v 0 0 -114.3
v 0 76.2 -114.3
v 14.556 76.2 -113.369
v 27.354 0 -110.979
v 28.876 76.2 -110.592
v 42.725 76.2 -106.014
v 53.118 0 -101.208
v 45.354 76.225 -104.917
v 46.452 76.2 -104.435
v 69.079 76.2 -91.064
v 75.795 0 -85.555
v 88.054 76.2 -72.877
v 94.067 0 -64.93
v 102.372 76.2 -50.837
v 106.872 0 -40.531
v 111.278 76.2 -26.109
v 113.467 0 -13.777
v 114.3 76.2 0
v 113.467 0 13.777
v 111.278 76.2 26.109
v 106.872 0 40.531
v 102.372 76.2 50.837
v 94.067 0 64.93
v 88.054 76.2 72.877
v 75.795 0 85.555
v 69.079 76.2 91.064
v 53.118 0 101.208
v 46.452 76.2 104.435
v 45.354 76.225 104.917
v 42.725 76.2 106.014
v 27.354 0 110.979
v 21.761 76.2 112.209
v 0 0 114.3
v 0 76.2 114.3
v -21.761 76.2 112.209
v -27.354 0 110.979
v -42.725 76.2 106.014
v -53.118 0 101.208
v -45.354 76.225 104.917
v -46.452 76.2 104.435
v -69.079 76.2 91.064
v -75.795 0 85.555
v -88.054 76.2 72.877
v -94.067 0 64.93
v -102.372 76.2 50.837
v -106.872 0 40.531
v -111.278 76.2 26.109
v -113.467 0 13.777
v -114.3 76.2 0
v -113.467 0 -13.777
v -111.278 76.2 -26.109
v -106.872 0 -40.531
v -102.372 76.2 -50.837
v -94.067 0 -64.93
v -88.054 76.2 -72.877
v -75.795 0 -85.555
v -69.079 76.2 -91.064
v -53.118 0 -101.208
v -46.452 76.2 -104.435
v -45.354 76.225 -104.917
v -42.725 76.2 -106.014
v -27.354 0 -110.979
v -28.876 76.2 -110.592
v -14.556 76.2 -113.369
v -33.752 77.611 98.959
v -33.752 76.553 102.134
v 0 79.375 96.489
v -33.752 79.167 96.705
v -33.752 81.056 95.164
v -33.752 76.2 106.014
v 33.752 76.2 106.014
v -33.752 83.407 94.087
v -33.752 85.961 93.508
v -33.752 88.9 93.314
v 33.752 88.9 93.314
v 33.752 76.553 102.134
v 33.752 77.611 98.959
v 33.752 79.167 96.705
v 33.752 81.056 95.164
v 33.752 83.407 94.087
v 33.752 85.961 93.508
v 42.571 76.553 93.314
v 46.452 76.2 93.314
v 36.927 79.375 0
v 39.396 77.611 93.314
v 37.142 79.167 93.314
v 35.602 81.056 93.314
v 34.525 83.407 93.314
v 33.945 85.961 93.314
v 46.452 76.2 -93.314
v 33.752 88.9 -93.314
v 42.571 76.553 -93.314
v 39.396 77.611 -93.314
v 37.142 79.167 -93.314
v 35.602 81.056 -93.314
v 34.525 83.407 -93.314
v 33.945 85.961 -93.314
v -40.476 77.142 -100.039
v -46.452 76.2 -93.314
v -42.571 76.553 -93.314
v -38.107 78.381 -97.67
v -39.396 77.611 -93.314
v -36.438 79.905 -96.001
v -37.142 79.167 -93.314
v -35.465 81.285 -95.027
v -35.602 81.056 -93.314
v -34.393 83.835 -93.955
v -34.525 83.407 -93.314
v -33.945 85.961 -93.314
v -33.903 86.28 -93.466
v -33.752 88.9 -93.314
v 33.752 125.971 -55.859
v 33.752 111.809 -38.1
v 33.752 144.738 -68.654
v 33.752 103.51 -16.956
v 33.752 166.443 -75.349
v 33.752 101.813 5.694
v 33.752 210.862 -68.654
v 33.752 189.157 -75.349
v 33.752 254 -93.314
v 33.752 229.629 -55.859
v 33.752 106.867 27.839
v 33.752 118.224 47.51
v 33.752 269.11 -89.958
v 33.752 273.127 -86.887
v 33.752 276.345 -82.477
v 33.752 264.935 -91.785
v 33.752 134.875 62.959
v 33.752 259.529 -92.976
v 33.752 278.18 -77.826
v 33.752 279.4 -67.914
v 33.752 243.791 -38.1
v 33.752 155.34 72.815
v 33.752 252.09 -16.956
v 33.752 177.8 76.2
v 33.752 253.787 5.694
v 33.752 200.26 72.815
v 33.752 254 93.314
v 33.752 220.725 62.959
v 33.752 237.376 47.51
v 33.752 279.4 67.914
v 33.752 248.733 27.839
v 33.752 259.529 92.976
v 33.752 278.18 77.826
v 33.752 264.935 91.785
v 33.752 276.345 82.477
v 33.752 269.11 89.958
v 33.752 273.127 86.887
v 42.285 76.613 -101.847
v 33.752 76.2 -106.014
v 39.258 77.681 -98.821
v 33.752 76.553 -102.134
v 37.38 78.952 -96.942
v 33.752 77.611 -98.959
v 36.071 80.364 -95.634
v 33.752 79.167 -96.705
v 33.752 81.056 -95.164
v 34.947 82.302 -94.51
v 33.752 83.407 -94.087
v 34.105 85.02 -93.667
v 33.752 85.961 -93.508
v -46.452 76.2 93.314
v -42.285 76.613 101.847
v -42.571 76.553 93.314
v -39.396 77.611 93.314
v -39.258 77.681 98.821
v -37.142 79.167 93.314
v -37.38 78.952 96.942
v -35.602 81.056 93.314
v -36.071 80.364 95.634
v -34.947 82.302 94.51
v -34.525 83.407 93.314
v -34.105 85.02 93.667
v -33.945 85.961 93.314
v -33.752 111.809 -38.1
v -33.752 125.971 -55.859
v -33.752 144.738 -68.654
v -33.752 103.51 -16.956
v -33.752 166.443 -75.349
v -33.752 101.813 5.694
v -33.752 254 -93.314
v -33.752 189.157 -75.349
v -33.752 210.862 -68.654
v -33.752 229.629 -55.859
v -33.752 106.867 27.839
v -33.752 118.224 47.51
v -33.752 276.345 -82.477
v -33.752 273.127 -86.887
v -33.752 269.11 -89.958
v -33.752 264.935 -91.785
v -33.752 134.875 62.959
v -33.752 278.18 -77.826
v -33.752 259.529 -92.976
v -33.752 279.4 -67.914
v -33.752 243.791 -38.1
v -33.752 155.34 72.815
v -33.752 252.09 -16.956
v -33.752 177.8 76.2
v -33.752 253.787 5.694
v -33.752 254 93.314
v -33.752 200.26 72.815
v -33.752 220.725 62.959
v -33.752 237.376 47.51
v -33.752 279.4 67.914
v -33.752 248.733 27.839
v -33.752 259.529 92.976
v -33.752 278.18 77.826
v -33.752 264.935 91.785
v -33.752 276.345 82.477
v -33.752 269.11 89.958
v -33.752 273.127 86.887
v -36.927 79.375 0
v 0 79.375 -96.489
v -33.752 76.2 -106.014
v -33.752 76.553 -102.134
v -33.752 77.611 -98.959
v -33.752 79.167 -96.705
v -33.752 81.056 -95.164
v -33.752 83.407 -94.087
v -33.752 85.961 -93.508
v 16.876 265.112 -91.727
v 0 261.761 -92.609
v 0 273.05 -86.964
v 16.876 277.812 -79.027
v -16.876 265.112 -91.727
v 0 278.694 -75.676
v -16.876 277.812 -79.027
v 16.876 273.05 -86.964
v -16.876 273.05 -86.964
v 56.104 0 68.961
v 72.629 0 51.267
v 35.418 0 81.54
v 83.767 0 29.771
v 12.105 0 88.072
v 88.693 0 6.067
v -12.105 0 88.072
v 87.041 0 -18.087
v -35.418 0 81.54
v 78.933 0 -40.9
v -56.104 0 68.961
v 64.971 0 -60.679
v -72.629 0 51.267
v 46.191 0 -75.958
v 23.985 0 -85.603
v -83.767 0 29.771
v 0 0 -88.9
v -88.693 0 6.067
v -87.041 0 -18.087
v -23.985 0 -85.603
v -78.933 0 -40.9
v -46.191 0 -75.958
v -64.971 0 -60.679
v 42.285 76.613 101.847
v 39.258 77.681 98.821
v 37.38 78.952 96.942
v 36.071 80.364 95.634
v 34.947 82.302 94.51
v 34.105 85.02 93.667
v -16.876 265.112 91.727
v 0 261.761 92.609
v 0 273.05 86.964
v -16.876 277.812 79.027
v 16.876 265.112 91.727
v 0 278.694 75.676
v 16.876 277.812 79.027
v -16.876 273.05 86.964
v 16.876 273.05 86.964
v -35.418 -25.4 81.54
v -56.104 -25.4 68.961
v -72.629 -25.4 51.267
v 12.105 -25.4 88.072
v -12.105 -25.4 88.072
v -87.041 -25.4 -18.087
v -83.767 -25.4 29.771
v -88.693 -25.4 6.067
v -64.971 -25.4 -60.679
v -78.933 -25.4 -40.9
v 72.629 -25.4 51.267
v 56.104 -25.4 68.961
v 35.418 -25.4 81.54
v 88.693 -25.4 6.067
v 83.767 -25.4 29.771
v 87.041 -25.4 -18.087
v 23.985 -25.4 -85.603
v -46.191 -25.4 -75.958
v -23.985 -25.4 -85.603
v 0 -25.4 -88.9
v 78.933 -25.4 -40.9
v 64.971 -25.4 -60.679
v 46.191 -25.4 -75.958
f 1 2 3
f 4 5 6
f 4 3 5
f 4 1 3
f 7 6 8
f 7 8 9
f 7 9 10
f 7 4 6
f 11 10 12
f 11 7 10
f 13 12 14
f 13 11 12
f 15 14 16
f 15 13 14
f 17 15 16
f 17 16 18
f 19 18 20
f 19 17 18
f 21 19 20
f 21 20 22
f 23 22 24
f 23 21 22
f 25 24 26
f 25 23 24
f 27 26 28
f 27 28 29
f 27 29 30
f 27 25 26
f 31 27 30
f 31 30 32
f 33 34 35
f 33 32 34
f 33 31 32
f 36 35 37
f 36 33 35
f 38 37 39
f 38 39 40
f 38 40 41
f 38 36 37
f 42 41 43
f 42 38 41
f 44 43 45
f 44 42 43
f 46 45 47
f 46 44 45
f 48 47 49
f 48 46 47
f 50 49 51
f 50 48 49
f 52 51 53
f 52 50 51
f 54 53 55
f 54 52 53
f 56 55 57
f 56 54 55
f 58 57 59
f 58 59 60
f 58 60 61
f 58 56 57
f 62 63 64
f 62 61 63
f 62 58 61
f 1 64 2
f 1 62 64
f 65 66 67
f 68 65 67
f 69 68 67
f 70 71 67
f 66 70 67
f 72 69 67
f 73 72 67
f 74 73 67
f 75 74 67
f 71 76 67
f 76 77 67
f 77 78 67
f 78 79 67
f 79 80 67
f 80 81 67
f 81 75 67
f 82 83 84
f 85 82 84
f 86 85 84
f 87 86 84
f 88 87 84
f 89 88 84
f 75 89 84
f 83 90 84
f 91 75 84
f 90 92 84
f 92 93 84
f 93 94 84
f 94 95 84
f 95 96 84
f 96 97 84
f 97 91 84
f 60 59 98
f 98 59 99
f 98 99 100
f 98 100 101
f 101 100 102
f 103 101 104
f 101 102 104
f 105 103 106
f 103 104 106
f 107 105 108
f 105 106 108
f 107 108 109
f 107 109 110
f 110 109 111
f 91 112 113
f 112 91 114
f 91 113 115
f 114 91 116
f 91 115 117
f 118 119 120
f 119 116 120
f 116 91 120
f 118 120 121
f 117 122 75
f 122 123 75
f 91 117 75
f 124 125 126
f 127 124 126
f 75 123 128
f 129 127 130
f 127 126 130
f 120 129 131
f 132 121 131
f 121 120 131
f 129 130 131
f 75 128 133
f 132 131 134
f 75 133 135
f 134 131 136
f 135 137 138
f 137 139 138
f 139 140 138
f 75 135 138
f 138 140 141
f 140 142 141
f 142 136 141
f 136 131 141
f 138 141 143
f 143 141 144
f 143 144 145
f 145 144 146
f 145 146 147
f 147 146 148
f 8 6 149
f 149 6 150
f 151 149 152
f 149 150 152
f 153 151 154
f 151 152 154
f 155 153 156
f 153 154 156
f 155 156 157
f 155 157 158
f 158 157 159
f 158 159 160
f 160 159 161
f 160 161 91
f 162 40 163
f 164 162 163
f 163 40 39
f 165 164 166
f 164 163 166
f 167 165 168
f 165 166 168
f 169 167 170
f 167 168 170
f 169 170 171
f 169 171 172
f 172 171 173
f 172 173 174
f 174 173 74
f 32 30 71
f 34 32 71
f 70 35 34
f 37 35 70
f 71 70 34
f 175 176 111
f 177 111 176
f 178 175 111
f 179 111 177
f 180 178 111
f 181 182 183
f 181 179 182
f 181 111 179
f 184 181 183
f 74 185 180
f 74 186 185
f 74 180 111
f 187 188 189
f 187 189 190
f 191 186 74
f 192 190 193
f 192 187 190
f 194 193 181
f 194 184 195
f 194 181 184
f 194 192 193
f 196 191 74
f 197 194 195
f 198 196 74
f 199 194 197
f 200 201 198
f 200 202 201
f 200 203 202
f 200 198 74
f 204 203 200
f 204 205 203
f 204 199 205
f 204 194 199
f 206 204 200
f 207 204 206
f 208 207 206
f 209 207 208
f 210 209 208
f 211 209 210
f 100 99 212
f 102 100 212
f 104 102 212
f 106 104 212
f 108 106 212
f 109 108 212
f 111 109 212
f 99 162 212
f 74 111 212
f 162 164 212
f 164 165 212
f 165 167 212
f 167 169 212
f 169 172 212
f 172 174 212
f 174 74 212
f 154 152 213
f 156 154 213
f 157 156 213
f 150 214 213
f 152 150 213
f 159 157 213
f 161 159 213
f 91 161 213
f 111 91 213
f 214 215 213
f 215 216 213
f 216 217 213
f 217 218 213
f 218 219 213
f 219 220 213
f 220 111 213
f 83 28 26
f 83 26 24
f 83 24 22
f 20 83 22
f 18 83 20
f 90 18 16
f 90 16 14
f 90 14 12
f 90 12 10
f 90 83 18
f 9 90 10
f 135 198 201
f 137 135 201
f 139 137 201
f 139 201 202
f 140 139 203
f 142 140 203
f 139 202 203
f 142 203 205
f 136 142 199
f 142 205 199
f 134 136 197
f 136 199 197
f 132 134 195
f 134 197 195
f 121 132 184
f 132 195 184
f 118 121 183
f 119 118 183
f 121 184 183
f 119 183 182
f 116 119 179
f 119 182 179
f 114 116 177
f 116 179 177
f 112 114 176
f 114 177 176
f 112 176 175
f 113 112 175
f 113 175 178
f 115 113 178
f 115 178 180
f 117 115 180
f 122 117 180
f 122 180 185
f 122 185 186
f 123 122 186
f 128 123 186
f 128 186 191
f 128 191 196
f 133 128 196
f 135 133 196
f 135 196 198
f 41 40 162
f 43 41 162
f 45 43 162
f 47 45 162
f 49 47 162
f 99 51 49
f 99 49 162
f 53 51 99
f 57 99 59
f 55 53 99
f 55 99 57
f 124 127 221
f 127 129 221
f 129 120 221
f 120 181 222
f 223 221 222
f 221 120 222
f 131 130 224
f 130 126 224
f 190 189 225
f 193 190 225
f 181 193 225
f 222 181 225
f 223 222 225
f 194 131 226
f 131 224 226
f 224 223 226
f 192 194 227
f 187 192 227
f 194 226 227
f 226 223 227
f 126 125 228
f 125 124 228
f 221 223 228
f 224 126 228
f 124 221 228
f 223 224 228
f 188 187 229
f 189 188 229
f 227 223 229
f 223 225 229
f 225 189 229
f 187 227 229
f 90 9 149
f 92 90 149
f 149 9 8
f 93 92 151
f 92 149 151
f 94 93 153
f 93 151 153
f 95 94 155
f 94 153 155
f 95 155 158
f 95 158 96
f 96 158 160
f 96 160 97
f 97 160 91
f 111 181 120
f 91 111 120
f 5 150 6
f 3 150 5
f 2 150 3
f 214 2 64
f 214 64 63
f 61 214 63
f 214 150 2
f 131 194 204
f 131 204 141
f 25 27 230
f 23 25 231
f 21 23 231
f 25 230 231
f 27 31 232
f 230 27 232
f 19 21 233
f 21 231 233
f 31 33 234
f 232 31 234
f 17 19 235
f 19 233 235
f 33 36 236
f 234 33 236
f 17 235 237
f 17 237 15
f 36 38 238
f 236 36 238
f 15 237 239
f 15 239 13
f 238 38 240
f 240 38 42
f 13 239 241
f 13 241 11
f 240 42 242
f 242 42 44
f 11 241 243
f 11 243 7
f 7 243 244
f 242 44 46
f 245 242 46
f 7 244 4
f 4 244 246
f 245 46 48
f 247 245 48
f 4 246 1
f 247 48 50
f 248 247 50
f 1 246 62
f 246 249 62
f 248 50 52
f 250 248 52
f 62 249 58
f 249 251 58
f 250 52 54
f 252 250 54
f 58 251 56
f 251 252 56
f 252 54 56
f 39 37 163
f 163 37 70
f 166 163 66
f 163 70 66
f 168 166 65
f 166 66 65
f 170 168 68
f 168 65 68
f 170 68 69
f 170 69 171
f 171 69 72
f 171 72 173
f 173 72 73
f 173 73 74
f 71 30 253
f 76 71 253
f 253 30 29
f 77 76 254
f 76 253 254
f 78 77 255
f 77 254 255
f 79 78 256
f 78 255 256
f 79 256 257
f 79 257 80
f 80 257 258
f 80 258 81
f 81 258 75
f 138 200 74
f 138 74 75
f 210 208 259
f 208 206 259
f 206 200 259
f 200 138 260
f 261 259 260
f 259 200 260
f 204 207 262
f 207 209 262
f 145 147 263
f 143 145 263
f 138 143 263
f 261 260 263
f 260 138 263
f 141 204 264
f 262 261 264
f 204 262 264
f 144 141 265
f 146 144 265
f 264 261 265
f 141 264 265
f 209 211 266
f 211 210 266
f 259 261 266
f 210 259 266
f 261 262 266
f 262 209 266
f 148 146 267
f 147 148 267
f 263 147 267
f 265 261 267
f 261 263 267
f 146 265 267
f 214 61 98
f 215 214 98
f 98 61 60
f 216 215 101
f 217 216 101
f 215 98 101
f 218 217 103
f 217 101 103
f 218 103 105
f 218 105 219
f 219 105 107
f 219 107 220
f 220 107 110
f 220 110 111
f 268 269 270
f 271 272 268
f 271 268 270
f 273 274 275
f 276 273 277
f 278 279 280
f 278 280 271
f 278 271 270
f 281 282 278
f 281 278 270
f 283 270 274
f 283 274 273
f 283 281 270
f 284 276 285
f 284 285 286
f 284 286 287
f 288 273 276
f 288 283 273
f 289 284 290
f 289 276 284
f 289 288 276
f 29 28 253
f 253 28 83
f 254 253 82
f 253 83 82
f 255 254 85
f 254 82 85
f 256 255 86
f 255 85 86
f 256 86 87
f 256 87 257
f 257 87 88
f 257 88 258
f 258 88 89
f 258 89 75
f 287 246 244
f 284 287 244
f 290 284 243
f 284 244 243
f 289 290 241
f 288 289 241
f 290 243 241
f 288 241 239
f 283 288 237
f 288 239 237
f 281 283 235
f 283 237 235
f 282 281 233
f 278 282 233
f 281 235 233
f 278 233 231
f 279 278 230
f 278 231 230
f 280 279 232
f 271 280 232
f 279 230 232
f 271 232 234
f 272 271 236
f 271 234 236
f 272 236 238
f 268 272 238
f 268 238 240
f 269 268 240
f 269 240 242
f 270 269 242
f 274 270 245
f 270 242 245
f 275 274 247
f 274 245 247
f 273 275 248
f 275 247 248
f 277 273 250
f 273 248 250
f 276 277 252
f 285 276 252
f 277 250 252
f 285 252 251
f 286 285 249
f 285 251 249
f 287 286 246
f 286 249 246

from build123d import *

# Parameters (mm, degrees)
SKETCH1_R           = 114.3
BOSS_EXTRUDE1_DEPTH = 76.2
SKETCH2_R           = 88.9
BOSS_EXTRUDE2_DEPTH = 25.4
SKETCH3_W           = 67.503621206
SKETCH3_H           = 186.628871474
BOSS_EXTRUDE3_DEPTH = 203.2
SKETCH4_R           = 76.2
CUT_EXTRUDE1_DEPTH  = 127
FILLET1_SIZE        = 25.4
FILLET2_SIZE        = 12.7


with BuildPart() as part:
    # Sketch1 → Boss-Extrude1 (new body)
    with BuildSketch(Plane(origin=(0, 0, 0), x_dir=(1, 0, 0), z_dir=(0, 1, 0))):
        with Locations(Location((0, 0, 0), (0, 0, 90))):
            Circle(SKETCH1_R)
    extrude(amount=BOSS_EXTRUDE1_DEPTH)

    # Sketch2 → Boss-Extrude2 (add)
    with BuildSketch(Plane(origin=(0, 0, 0), x_dir=(-1, 0, 0), z_dir=(0, -1, 0))):
        with Locations(Location((0, 0, 0), (0, 0, 90))):
            Circle(SKETCH2_R)
    extrude(amount=BOSS_EXTRUDE2_DEPTH)

    # Sketch3 → Boss-Extrude3 (add)
    with BuildSketch(Plane(origin=(0, 76.2, 0), x_dir=(1, 0, 0), z_dir=(0, 1, 0))):
        Rectangle(SKETCH3_W, SKETCH3_H)
    extrude(amount=BOSS_EXTRUDE3_DEPTH)

    # Sketch4 → Cut-Extrude1 (cut)
    with BuildSketch(Plane.ZY.offset(33.751810603)):
        with Locations((0, 177.8)):
            Circle(SKETCH4_R)
    extrude(amount=-CUT_EXTRUDE1_DEPTH, mode=Mode.SUBTRACT)

    # Fillet1
    # a fillet whose section is not a circle: 25.4 mm, written as the material it takes off along each edge
    with BuildSketch(Plane(origin=(97.251810603, 279.4, 93.314435737), x_dir=(0, -1, 0), z_dir=(-1, 0, 0)), Plane(origin=(-97.251810603, 279.4, -93.314435737), x_dir=(0, -1, 0), z_dir=(1, 0, 0))) as fillet1_piece_1:
        with BuildLine():
            Bezier((FILLET1_SIZE, 0), (0, 0), (0, -FILLET1_SIZE), weights=[1, 1, 1])
            Line((0, -FILLET1_SIZE), (0, 0))
            Line((0, 0), (FILLET1_SIZE, 0))
        make_face()
    extrude(amount=194.503621206, mode=Mode.SUBTRACT)

    # Fillet2
    # a fillet whose section is not a circle: 12.7 mm, written as the material it adds along each edge
    with BuildSketch(Plane(origin=(33.751810603, 76.2, 93.314435737), x_dir=(0, 0, 1), z_dir=(-1, 0, 0)), Plane(origin=(-33.751810603, 76.2, -93.314435737), x_dir=(0, 0, -1), z_dir=(1, 0, 0))) as fillet2_piece_1:
        with BuildLine():
            Bezier((FILLET2_SIZE, 0), (0, 0), (0, FILLET2_SIZE), weights=[1, 1, 1])
            Line((0, FILLET2_SIZE), (0, 0))
            Line((0, 0), (FILLET2_SIZE, 0))
        make_face()
    extrude(amount=67.503621206)
    with BuildSketch(Plane(origin=(-33.751810603, 76.2, 93.314435737), x_dir=(-1, 0, 0), z_dir=(0, 0, -1)), Plane(origin=(33.751810603, 76.2, -93.314435737), x_dir=(1, 0, 0), z_dir=(0, 0, 1))) as fillet2_piece_2:
        with BuildLine():
            Bezier((FILLET2_SIZE, 0), (0, 0), (0, FILLET2_SIZE), weights=[1, 1, 1])
            Line((0, FILLET2_SIZE), (0, 0))
            Line((0, 0), (FILLET2_SIZE, 0))
        make_face()
    extrude(amount=186.628871474)
    with BuildSketch(Plane(origin=(65.501810603, 76.2, 93.314435737), x_dir=(0, 0, 1), z_dir=(-1, 0, 0))) as fillet2_piece_3a_section:
        with BuildLine():
            Bezier((FILLET2_SIZE, 0), (0, 0), (0, FILLET2_SIZE), weights=[1, 1, 1])
            Line((0, FILLET2_SIZE), (0, 0))
            Line((0, 0), (FILLET2_SIZE, 0))
        make_face()
    fillet2_piece_3a = extrude(amount=99.253621206, mode=Mode.PRIVATE)
    fillet2_piece_3a = fillet2_piece_3a & Plane(origin=(0, 76.2, 0), x_dir=(0, 0, -1), z_dir=(0, -1, 0)) * Cylinder(114.3, 250, mode=Mode.PRIVATE)
    fillet2_piece_3a = split(fillet2_piece_3a, bisect_by=Plane(origin=(33.751810603, 76.2, 93.314435737), z_dir=(1, 0, 0)), keep=Keep.TOP, mode=Mode.PRIVATE)
    with BuildSketch(Plane(origin=(33.751810603, 76.2, -93.314435737), x_dir=(1, 0, 0), z_dir=(0, 0, 1))) as fillet2_piece_3b_section:
        with BuildLine():
            Bezier((FILLET2_SIZE, 0), (0, 0), (0, FILLET2_SIZE), weights=[1, 1, 1])
            Line((0, FILLET2_SIZE), (0, 0))
            Line((0, 0), (FILLET2_SIZE, 0))
        make_face()
    fillet2_piece_3b = extrude(amount=218.378871474, mode=Mode.PRIVATE)
    fillet2_piece_3b = fillet2_piece_3b & Plane(origin=(0, 76.2, 0), x_dir=(0, 0, -1), z_dir=(0, -1, 0)) * Cylinder(114.3, 488, mode=Mode.PRIVATE)
    fillet2_piece_3b = split(fillet2_piece_3b, bisect_by=Plane(origin=(33.751810603, 76.2, 93.314435737), z_dir=(0, 0, 1)), keep=Keep.TOP, mode=Mode.PRIVATE)
    fillet2_piece_3 = fillet2_piece_3a & fillet2_piece_3b
    add(fillet2_piece_3)
    with BuildSketch(Plane(origin=(-33.751810603, 76.2, 125.064435737), x_dir=(-1, 0, 0), z_dir=(0, 0, -1))) as fillet2_piece_4a_section:
        with BuildLine():
            Bezier((FILLET2_SIZE, 0), (0, 0), (0, FILLET2_SIZE), weights=[1, 1, 1])
            Line((0, FILLET2_SIZE), (0, 0))
            Line((0, 0), (FILLET2_SIZE, 0))
        make_face()
    fillet2_piece_4a = extrude(amount=218.378871474, mode=Mode.PRIVATE)
    fillet2_piece_4a = fillet2_piece_4a & Plane(origin=(0, 76.2, 0), x_dir=(0, 0, -1), z_dir=(0, -1, 0)) * Cylinder(114.3, 488, mode=Mode.PRIVATE)
    fillet2_piece_4a = split(fillet2_piece_4a, bisect_by=Plane(origin=(-33.751810603, 76.2, 93.314435737), z_dir=(0, 0, 1)), keep=Keep.TOP, mode=Mode.PRIVATE)
    with BuildSketch(Plane(origin=(33.751810603, 76.2, 93.314435737), x_dir=(0, 0, 1), z_dir=(-1, 0, 0))) as fillet2_piece_4b_section:
        with BuildLine():
            Bezier((FILLET2_SIZE, 0), (0, 0), (0, FILLET2_SIZE), weights=[1, 1, 1])
            Line((0, FILLET2_SIZE), (0, 0))
            Line((0, 0), (FILLET2_SIZE, 0))
        make_face()
    fillet2_piece_4b = extrude(amount=99.253621206, mode=Mode.PRIVATE)
    fillet2_piece_4b = fillet2_piece_4b & Plane(origin=(0, 76.2, 0), x_dir=(0, 0, -1), z_dir=(0, -1, 0)) * Cylinder(114.3, 250, mode=Mode.PRIVATE)
    fillet2_piece_4b = split(fillet2_piece_4b, bisect_by=Plane(origin=(-33.751810603, 76.2, 93.314435737), z_dir=(-1, 0, 0)), keep=Keep.TOP, mode=Mode.PRIVATE)
    fillet2_piece_4 = fillet2_piece_4a & fillet2_piece_4b
    add(fillet2_piece_4)
    with BuildSketch(Plane(origin=(-33.751810603, 76.2, 93.314435737), x_dir=(-1, 0, 0), z_dir=(0, 0, -1))) as fillet2_piece_5a_section:
        with BuildLine():
            Bezier((FILLET2_SIZE, 0), (0, 0), (0, FILLET2_SIZE), weights=[1, 1, 1])
            Line((0, FILLET2_SIZE), (0, 0))
            Line((0, 0), (FILLET2_SIZE, 0))
        make_face()
    fillet2_piece_5a = extrude(amount=218.378871474, mode=Mode.PRIVATE)
    fillet2_piece_5a = fillet2_piece_5a & Plane(origin=(0, 76.2, 0), x_dir=(0, 0, -1), z_dir=(0, -1, 0)) * Cylinder(114.3, 488, mode=Mode.PRIVATE)
    fillet2_piece_5a = split(fillet2_piece_5a, bisect_by=Plane(origin=(-33.751810603, 76.2, -93.314435737), z_dir=(0, 0, -1)), keep=Keep.TOP, mode=Mode.PRIVATE)
    with BuildSketch(Plane(origin=(-65.501810603, 76.2, -93.314435737), x_dir=(0, 0, -1), z_dir=(1, 0, 0))) as fillet2_piece_5b_section:
        with BuildLine():
            Bezier((FILLET2_SIZE, 0), (0, 0), (0, FILLET2_SIZE), weights=[1, 1, 1])
            Line((0, FILLET2_SIZE), (0, 0))
            Line((0, 0), (FILLET2_SIZE, 0))
        make_face()
    fillet2_piece_5b = extrude(amount=99.253621206, mode=Mode.PRIVATE)
    fillet2_piece_5b = fillet2_piece_5b & Plane(origin=(0, 76.2, 0), x_dir=(0, 0, -1), z_dir=(0, -1, 0)) * Cylinder(114.3, 250, mode=Mode.PRIVATE)
    fillet2_piece_5b = split(fillet2_piece_5b, bisect_by=Plane(origin=(-33.751810603, 76.2, -93.314435737), z_dir=(-1, 0, 0)), keep=Keep.TOP, mode=Mode.PRIVATE)
    fillet2_piece_5 = fillet2_piece_5a & fillet2_piece_5b
    add(fillet2_piece_5)
    with BuildSketch(Plane(origin=(33.751810603, 76.2, -125.064435737), x_dir=(1, 0, 0), z_dir=(0, 0, 1))) as fillet2_piece_6a_section:
        with BuildLine():
            Bezier((FILLET2_SIZE, 0), (0, 0), (0, FILLET2_SIZE), weights=[1, 1, 1])
            Line((0, FILLET2_SIZE), (0, 0))
            Line((0, 0), (FILLET2_SIZE, 0))
        make_face()
    fillet2_piece_6a = extrude(amount=218.378871474, mode=Mode.PRIVATE)
    fillet2_piece_6a = fillet2_piece_6a & Plane(origin=(0, 76.2, 0), x_dir=(0, 0, -1), z_dir=(0, -1, 0)) * Cylinder(114.3, 488, mode=Mode.PRIVATE)
    fillet2_piece_6a = split(fillet2_piece_6a, bisect_by=Plane(origin=(33.751810603, 76.2, -93.314435737), z_dir=(0, 0, -1)), keep=Keep.TOP, mode=Mode.PRIVATE)
    with BuildSketch(Plane(origin=(-33.751810603, 76.2, -93.314435737), x_dir=(0, 0, -1), z_dir=(1, 0, 0))) as fillet2_piece_6b_section:
        with BuildLine():
            Bezier((FILLET2_SIZE, 0), (0, 0), (0, FILLET2_SIZE), weights=[1, 1, 1])
            Line((0, FILLET2_SIZE), (0, 0))
            Line((0, 0), (FILLET2_SIZE, 0))
        make_face()
    fillet2_piece_6b = extrude(amount=99.253621206, mode=Mode.PRIVATE)
    fillet2_piece_6b = fillet2_piece_6b & Plane(origin=(0, 76.2, 0), x_dir=(0, 0, -1), z_dir=(0, -1, 0)) * Cylinder(114.3, 250, mode=Mode.PRIVATE)
    fillet2_piece_6b = split(fillet2_piece_6b, bisect_by=Plane(origin=(33.751810603, 76.2, -93.314435737), z_dir=(1, 0, 0)), keep=Keep.TOP, mode=Mode.PRIVATE)
    fillet2_piece_6 = fillet2_piece_6a & fillet2_piece_6b
    add(fillet2_piece_6)


solid = part.part
